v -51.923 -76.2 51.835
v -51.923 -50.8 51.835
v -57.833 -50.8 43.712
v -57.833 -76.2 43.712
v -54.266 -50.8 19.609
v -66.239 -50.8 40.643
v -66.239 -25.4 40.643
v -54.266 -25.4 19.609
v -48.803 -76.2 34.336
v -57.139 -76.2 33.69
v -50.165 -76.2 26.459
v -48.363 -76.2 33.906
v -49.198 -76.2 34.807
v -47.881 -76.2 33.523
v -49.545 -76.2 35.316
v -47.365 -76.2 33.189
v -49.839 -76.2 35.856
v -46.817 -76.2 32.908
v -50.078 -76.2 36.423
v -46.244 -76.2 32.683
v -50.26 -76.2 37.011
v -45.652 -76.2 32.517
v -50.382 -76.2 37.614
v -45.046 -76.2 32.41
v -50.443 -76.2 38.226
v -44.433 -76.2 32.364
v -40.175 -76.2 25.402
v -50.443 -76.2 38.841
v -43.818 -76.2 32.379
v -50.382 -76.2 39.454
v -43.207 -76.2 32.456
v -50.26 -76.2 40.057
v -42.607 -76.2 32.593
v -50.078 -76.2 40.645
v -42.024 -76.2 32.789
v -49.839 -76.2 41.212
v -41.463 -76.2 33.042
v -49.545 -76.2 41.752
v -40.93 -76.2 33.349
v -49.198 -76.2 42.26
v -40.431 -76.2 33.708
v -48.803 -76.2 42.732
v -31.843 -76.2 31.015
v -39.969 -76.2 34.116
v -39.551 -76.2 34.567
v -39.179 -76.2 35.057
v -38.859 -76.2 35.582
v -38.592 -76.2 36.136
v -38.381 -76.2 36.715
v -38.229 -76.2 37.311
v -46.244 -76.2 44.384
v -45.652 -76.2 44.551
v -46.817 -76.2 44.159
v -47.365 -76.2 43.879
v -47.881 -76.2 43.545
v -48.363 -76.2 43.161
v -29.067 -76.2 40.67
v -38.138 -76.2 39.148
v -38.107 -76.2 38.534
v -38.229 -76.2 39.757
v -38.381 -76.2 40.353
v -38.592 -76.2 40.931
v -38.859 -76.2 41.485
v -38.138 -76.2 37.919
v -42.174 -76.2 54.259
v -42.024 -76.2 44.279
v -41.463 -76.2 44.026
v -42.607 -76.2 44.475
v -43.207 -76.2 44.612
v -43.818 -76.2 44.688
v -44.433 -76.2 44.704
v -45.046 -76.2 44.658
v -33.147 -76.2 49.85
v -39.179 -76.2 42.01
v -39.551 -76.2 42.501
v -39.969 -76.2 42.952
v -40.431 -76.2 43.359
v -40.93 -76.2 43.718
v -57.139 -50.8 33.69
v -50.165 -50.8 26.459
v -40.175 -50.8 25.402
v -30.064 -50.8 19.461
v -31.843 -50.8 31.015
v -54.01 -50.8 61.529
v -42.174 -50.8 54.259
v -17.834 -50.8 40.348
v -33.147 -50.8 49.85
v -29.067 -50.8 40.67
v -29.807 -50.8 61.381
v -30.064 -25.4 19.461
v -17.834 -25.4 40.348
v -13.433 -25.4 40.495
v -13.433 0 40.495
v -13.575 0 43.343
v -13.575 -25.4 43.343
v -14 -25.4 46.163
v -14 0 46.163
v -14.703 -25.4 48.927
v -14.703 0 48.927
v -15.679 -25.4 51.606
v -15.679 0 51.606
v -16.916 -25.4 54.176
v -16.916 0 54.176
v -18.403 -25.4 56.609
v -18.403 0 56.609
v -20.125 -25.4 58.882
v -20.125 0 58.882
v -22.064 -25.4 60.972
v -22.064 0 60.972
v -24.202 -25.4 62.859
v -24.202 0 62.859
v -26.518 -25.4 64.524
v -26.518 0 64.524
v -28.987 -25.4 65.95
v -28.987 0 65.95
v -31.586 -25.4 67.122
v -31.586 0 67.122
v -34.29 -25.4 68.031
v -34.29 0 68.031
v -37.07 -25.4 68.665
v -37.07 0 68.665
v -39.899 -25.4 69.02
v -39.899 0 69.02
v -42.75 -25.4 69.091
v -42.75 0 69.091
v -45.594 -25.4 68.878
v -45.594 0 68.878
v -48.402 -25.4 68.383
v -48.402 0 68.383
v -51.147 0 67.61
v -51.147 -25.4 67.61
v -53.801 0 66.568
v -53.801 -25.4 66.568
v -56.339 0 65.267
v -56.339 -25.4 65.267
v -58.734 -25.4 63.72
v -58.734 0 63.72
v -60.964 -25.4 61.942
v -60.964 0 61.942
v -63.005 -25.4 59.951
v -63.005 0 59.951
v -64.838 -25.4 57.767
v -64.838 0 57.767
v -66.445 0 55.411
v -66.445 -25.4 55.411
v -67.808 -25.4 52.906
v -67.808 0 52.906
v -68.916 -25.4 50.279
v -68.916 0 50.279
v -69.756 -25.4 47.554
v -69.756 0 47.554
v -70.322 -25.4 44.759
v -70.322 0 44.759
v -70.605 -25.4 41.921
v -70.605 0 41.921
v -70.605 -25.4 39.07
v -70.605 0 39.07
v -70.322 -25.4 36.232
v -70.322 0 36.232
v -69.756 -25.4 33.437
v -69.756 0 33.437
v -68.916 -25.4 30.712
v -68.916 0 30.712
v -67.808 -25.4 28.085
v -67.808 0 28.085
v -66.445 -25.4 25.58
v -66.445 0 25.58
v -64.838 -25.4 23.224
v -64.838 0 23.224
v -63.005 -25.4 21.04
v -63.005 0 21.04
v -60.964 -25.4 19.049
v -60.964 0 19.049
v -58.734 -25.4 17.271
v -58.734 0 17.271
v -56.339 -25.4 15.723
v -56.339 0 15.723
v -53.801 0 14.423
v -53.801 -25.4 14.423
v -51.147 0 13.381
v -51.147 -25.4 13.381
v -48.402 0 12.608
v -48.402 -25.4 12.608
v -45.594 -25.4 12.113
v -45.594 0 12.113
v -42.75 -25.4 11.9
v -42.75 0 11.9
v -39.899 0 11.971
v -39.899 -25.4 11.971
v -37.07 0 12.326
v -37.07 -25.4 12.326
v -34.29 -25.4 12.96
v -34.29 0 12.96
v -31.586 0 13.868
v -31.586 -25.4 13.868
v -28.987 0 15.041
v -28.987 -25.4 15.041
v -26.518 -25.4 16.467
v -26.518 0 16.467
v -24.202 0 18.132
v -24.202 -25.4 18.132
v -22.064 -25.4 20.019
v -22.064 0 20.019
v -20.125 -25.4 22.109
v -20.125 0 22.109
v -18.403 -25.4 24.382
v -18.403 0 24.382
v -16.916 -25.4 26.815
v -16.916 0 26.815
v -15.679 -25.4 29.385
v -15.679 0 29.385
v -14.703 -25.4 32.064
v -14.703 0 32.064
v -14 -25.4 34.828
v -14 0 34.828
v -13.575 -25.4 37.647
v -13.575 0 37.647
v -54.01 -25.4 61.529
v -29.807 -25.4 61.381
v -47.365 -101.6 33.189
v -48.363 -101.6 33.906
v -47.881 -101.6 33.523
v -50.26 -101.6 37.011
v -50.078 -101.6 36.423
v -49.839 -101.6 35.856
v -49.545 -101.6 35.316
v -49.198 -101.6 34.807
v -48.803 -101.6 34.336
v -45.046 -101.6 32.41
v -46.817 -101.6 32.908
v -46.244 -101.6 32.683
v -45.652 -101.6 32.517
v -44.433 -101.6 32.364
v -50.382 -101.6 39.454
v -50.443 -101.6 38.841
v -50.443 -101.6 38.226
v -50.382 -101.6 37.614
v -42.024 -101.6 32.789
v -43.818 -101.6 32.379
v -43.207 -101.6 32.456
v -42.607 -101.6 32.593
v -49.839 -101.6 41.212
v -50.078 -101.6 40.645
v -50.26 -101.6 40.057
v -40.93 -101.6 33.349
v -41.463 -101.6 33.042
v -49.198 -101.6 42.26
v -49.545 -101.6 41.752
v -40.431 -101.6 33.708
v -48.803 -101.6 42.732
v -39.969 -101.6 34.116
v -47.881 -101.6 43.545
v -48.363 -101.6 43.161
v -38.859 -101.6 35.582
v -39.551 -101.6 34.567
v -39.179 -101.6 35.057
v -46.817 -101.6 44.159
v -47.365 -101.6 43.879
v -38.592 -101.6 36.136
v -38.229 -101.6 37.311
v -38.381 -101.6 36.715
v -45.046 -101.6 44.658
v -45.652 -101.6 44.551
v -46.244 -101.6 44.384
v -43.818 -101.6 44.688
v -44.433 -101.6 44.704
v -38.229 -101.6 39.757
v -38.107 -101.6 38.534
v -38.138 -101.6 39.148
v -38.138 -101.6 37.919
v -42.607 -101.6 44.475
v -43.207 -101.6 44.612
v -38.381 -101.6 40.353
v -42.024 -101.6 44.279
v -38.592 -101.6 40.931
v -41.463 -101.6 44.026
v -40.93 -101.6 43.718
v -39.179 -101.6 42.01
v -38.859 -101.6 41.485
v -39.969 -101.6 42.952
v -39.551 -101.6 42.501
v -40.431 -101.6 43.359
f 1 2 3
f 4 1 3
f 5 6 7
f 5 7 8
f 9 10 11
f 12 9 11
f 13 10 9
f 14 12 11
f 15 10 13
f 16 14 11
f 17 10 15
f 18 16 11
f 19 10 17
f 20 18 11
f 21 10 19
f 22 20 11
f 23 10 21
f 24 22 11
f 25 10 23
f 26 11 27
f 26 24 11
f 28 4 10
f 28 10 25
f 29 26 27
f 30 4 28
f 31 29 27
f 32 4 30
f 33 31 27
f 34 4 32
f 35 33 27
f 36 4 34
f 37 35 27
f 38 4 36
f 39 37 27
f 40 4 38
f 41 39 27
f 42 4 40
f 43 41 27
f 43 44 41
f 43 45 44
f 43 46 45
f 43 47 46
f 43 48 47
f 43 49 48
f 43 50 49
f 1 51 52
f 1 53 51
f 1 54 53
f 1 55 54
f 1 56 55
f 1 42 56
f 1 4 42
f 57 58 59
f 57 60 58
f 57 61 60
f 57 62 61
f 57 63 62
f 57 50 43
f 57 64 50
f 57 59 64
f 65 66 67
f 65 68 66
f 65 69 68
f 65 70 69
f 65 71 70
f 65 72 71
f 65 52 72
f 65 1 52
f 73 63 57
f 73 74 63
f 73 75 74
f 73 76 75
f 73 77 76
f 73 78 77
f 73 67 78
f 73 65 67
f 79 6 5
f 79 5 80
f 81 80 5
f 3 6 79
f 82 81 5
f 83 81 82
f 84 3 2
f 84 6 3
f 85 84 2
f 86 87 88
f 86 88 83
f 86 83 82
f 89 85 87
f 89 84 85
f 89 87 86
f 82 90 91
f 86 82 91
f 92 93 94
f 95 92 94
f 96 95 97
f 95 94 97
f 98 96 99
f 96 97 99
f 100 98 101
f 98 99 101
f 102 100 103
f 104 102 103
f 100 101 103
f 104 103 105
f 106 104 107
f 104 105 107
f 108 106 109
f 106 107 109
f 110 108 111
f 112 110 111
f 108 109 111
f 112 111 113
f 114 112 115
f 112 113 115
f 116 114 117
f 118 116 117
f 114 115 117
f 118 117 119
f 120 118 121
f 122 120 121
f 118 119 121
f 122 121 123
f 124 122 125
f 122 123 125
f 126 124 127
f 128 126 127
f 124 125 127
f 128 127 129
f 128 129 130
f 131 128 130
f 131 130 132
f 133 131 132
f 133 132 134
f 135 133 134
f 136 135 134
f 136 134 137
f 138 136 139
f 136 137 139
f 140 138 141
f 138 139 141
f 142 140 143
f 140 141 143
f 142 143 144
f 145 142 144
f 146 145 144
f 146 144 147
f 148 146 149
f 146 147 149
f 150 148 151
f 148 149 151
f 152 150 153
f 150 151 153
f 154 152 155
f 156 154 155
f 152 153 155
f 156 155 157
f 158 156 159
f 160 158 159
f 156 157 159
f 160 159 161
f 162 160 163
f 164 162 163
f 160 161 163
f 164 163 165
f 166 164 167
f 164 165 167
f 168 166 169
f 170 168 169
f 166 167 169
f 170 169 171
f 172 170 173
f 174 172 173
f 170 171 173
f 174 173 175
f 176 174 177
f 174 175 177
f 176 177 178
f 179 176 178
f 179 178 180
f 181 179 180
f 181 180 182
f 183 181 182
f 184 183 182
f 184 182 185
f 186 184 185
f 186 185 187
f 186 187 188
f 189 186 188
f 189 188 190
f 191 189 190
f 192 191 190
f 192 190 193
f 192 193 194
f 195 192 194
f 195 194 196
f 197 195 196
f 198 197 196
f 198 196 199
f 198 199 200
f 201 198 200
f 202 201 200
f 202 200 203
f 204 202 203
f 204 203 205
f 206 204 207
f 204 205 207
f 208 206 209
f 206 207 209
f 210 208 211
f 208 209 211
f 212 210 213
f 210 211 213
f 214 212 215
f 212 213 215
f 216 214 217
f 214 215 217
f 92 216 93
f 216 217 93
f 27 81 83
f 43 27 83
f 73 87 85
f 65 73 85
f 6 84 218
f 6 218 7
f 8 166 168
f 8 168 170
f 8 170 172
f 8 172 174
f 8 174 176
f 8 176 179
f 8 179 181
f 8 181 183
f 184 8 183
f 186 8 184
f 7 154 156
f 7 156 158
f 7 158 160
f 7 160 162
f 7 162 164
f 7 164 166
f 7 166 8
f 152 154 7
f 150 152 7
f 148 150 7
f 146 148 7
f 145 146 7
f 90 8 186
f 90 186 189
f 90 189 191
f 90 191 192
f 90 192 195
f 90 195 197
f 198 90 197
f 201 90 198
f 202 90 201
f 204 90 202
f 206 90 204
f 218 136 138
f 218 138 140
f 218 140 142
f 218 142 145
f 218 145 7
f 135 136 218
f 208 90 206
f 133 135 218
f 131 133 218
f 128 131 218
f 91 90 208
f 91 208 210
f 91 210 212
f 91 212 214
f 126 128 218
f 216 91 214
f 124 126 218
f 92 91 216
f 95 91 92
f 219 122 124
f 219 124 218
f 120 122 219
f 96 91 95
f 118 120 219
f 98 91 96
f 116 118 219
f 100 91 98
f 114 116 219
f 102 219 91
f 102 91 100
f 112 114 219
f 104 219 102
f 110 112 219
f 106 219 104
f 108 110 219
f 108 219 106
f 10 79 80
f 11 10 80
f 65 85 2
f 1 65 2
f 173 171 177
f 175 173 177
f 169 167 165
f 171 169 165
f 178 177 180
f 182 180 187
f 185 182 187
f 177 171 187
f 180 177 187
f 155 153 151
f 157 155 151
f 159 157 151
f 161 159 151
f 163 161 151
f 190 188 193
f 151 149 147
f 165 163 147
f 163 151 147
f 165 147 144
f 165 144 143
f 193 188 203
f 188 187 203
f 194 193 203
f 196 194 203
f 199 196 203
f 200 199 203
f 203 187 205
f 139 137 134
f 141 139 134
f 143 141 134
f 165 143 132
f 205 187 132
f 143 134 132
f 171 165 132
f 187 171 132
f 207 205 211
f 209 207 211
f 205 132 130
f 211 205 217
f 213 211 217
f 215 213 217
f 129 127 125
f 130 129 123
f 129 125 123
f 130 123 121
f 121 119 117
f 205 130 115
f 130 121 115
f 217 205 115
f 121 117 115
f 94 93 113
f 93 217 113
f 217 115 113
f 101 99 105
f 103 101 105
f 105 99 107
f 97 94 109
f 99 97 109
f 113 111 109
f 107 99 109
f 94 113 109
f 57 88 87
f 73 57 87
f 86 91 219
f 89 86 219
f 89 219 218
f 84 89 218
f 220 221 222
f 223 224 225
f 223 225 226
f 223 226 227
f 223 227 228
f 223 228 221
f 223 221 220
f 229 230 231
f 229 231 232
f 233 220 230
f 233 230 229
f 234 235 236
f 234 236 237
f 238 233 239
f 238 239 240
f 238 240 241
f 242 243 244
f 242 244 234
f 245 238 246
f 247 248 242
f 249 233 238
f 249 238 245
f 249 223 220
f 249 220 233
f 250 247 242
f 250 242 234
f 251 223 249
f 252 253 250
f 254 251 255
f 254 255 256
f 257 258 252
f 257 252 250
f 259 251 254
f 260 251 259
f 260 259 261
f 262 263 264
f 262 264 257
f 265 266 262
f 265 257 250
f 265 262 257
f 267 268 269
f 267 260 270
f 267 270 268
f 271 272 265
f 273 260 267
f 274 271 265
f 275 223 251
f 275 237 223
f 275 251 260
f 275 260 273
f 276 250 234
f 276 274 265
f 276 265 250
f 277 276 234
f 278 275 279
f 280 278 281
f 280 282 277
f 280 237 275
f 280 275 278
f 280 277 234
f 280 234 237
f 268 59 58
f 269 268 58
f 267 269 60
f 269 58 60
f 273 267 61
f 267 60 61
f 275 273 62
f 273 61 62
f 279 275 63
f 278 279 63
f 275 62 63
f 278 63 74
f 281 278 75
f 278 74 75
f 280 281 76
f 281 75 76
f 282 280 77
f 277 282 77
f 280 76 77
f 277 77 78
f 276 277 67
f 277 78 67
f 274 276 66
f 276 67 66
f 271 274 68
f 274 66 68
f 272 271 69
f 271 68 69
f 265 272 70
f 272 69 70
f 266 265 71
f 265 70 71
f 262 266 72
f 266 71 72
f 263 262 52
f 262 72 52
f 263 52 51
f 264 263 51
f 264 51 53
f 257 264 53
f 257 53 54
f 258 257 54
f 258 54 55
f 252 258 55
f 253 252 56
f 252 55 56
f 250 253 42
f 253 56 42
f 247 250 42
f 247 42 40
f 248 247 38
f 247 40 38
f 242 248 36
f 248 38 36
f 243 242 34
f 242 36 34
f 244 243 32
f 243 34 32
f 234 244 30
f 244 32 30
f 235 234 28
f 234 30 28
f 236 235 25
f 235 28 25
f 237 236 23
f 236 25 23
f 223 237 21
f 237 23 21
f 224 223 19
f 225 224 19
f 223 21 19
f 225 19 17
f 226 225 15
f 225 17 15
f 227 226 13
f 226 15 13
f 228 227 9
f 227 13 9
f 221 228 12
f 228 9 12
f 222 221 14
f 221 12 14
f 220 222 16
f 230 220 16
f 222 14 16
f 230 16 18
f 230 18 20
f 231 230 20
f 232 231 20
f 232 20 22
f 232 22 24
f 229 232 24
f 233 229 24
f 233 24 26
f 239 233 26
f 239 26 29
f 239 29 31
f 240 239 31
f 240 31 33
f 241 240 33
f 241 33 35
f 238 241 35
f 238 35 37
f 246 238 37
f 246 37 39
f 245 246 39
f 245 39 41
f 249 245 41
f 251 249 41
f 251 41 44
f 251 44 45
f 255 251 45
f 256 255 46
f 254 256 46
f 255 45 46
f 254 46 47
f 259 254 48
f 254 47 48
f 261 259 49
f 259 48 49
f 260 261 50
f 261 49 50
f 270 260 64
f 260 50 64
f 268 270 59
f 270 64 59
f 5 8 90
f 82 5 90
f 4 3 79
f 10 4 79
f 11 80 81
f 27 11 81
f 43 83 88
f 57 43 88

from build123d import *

# Parameters (mm, degrees)
F0_R     = 28.604238
F1_DEPTH = 25.4
F3_DEPTH = 25.4
F5_DEPTH = 25.4
F6_R     = 6.17176
F7_DEPTH = 25.4


with BuildPart() as f1:
    # F0 (on Front) → F1 (new body)
    with BuildSketch(Plane.XZ):
        with Locations((-42.036779, 40.495433)):
            Circle(F0_R)
    extrude(amount=F1_DEPTH)

    # F2 (on face) → F3 (join)
    with BuildSketch(Plane.XZ.offset(25.4)):
        Polygon((-17.834256, 40.347526), (-29.807427, 61.381479), (-54.00995, 61.529386), (-66.239302, 40.643339), (-54.266131, 19.609387), (-30.063609, 19.46148), align=None)
    extrude(amount=F3_DEPTH)

    # F4 (on face) → F5 (join)
    with BuildSketch(Plane.XZ.offset(50.8)):
        Polygon((-29.067197, 40.669558), (-33.147233, 49.849639), (-42.173565, 54.259393), (-51.922672, 51.835446), (-57.832837, 43.71199), (-57.13863, 33.69008), (-50.164877, 26.45908), (-40.174675, 25.402454), (-31.84255, 31.01461), align=None)
    extrude(amount=F5_DEPTH)

    # F6 (on face) → F7 (join)
    with BuildSketch(Plane.XZ.offset(76.2)):
        with Locations((-44.278741, 38.533714)):
            Circle(F6_R)
    extrude(amount=F7_DEPTH)


solid = f1.part
